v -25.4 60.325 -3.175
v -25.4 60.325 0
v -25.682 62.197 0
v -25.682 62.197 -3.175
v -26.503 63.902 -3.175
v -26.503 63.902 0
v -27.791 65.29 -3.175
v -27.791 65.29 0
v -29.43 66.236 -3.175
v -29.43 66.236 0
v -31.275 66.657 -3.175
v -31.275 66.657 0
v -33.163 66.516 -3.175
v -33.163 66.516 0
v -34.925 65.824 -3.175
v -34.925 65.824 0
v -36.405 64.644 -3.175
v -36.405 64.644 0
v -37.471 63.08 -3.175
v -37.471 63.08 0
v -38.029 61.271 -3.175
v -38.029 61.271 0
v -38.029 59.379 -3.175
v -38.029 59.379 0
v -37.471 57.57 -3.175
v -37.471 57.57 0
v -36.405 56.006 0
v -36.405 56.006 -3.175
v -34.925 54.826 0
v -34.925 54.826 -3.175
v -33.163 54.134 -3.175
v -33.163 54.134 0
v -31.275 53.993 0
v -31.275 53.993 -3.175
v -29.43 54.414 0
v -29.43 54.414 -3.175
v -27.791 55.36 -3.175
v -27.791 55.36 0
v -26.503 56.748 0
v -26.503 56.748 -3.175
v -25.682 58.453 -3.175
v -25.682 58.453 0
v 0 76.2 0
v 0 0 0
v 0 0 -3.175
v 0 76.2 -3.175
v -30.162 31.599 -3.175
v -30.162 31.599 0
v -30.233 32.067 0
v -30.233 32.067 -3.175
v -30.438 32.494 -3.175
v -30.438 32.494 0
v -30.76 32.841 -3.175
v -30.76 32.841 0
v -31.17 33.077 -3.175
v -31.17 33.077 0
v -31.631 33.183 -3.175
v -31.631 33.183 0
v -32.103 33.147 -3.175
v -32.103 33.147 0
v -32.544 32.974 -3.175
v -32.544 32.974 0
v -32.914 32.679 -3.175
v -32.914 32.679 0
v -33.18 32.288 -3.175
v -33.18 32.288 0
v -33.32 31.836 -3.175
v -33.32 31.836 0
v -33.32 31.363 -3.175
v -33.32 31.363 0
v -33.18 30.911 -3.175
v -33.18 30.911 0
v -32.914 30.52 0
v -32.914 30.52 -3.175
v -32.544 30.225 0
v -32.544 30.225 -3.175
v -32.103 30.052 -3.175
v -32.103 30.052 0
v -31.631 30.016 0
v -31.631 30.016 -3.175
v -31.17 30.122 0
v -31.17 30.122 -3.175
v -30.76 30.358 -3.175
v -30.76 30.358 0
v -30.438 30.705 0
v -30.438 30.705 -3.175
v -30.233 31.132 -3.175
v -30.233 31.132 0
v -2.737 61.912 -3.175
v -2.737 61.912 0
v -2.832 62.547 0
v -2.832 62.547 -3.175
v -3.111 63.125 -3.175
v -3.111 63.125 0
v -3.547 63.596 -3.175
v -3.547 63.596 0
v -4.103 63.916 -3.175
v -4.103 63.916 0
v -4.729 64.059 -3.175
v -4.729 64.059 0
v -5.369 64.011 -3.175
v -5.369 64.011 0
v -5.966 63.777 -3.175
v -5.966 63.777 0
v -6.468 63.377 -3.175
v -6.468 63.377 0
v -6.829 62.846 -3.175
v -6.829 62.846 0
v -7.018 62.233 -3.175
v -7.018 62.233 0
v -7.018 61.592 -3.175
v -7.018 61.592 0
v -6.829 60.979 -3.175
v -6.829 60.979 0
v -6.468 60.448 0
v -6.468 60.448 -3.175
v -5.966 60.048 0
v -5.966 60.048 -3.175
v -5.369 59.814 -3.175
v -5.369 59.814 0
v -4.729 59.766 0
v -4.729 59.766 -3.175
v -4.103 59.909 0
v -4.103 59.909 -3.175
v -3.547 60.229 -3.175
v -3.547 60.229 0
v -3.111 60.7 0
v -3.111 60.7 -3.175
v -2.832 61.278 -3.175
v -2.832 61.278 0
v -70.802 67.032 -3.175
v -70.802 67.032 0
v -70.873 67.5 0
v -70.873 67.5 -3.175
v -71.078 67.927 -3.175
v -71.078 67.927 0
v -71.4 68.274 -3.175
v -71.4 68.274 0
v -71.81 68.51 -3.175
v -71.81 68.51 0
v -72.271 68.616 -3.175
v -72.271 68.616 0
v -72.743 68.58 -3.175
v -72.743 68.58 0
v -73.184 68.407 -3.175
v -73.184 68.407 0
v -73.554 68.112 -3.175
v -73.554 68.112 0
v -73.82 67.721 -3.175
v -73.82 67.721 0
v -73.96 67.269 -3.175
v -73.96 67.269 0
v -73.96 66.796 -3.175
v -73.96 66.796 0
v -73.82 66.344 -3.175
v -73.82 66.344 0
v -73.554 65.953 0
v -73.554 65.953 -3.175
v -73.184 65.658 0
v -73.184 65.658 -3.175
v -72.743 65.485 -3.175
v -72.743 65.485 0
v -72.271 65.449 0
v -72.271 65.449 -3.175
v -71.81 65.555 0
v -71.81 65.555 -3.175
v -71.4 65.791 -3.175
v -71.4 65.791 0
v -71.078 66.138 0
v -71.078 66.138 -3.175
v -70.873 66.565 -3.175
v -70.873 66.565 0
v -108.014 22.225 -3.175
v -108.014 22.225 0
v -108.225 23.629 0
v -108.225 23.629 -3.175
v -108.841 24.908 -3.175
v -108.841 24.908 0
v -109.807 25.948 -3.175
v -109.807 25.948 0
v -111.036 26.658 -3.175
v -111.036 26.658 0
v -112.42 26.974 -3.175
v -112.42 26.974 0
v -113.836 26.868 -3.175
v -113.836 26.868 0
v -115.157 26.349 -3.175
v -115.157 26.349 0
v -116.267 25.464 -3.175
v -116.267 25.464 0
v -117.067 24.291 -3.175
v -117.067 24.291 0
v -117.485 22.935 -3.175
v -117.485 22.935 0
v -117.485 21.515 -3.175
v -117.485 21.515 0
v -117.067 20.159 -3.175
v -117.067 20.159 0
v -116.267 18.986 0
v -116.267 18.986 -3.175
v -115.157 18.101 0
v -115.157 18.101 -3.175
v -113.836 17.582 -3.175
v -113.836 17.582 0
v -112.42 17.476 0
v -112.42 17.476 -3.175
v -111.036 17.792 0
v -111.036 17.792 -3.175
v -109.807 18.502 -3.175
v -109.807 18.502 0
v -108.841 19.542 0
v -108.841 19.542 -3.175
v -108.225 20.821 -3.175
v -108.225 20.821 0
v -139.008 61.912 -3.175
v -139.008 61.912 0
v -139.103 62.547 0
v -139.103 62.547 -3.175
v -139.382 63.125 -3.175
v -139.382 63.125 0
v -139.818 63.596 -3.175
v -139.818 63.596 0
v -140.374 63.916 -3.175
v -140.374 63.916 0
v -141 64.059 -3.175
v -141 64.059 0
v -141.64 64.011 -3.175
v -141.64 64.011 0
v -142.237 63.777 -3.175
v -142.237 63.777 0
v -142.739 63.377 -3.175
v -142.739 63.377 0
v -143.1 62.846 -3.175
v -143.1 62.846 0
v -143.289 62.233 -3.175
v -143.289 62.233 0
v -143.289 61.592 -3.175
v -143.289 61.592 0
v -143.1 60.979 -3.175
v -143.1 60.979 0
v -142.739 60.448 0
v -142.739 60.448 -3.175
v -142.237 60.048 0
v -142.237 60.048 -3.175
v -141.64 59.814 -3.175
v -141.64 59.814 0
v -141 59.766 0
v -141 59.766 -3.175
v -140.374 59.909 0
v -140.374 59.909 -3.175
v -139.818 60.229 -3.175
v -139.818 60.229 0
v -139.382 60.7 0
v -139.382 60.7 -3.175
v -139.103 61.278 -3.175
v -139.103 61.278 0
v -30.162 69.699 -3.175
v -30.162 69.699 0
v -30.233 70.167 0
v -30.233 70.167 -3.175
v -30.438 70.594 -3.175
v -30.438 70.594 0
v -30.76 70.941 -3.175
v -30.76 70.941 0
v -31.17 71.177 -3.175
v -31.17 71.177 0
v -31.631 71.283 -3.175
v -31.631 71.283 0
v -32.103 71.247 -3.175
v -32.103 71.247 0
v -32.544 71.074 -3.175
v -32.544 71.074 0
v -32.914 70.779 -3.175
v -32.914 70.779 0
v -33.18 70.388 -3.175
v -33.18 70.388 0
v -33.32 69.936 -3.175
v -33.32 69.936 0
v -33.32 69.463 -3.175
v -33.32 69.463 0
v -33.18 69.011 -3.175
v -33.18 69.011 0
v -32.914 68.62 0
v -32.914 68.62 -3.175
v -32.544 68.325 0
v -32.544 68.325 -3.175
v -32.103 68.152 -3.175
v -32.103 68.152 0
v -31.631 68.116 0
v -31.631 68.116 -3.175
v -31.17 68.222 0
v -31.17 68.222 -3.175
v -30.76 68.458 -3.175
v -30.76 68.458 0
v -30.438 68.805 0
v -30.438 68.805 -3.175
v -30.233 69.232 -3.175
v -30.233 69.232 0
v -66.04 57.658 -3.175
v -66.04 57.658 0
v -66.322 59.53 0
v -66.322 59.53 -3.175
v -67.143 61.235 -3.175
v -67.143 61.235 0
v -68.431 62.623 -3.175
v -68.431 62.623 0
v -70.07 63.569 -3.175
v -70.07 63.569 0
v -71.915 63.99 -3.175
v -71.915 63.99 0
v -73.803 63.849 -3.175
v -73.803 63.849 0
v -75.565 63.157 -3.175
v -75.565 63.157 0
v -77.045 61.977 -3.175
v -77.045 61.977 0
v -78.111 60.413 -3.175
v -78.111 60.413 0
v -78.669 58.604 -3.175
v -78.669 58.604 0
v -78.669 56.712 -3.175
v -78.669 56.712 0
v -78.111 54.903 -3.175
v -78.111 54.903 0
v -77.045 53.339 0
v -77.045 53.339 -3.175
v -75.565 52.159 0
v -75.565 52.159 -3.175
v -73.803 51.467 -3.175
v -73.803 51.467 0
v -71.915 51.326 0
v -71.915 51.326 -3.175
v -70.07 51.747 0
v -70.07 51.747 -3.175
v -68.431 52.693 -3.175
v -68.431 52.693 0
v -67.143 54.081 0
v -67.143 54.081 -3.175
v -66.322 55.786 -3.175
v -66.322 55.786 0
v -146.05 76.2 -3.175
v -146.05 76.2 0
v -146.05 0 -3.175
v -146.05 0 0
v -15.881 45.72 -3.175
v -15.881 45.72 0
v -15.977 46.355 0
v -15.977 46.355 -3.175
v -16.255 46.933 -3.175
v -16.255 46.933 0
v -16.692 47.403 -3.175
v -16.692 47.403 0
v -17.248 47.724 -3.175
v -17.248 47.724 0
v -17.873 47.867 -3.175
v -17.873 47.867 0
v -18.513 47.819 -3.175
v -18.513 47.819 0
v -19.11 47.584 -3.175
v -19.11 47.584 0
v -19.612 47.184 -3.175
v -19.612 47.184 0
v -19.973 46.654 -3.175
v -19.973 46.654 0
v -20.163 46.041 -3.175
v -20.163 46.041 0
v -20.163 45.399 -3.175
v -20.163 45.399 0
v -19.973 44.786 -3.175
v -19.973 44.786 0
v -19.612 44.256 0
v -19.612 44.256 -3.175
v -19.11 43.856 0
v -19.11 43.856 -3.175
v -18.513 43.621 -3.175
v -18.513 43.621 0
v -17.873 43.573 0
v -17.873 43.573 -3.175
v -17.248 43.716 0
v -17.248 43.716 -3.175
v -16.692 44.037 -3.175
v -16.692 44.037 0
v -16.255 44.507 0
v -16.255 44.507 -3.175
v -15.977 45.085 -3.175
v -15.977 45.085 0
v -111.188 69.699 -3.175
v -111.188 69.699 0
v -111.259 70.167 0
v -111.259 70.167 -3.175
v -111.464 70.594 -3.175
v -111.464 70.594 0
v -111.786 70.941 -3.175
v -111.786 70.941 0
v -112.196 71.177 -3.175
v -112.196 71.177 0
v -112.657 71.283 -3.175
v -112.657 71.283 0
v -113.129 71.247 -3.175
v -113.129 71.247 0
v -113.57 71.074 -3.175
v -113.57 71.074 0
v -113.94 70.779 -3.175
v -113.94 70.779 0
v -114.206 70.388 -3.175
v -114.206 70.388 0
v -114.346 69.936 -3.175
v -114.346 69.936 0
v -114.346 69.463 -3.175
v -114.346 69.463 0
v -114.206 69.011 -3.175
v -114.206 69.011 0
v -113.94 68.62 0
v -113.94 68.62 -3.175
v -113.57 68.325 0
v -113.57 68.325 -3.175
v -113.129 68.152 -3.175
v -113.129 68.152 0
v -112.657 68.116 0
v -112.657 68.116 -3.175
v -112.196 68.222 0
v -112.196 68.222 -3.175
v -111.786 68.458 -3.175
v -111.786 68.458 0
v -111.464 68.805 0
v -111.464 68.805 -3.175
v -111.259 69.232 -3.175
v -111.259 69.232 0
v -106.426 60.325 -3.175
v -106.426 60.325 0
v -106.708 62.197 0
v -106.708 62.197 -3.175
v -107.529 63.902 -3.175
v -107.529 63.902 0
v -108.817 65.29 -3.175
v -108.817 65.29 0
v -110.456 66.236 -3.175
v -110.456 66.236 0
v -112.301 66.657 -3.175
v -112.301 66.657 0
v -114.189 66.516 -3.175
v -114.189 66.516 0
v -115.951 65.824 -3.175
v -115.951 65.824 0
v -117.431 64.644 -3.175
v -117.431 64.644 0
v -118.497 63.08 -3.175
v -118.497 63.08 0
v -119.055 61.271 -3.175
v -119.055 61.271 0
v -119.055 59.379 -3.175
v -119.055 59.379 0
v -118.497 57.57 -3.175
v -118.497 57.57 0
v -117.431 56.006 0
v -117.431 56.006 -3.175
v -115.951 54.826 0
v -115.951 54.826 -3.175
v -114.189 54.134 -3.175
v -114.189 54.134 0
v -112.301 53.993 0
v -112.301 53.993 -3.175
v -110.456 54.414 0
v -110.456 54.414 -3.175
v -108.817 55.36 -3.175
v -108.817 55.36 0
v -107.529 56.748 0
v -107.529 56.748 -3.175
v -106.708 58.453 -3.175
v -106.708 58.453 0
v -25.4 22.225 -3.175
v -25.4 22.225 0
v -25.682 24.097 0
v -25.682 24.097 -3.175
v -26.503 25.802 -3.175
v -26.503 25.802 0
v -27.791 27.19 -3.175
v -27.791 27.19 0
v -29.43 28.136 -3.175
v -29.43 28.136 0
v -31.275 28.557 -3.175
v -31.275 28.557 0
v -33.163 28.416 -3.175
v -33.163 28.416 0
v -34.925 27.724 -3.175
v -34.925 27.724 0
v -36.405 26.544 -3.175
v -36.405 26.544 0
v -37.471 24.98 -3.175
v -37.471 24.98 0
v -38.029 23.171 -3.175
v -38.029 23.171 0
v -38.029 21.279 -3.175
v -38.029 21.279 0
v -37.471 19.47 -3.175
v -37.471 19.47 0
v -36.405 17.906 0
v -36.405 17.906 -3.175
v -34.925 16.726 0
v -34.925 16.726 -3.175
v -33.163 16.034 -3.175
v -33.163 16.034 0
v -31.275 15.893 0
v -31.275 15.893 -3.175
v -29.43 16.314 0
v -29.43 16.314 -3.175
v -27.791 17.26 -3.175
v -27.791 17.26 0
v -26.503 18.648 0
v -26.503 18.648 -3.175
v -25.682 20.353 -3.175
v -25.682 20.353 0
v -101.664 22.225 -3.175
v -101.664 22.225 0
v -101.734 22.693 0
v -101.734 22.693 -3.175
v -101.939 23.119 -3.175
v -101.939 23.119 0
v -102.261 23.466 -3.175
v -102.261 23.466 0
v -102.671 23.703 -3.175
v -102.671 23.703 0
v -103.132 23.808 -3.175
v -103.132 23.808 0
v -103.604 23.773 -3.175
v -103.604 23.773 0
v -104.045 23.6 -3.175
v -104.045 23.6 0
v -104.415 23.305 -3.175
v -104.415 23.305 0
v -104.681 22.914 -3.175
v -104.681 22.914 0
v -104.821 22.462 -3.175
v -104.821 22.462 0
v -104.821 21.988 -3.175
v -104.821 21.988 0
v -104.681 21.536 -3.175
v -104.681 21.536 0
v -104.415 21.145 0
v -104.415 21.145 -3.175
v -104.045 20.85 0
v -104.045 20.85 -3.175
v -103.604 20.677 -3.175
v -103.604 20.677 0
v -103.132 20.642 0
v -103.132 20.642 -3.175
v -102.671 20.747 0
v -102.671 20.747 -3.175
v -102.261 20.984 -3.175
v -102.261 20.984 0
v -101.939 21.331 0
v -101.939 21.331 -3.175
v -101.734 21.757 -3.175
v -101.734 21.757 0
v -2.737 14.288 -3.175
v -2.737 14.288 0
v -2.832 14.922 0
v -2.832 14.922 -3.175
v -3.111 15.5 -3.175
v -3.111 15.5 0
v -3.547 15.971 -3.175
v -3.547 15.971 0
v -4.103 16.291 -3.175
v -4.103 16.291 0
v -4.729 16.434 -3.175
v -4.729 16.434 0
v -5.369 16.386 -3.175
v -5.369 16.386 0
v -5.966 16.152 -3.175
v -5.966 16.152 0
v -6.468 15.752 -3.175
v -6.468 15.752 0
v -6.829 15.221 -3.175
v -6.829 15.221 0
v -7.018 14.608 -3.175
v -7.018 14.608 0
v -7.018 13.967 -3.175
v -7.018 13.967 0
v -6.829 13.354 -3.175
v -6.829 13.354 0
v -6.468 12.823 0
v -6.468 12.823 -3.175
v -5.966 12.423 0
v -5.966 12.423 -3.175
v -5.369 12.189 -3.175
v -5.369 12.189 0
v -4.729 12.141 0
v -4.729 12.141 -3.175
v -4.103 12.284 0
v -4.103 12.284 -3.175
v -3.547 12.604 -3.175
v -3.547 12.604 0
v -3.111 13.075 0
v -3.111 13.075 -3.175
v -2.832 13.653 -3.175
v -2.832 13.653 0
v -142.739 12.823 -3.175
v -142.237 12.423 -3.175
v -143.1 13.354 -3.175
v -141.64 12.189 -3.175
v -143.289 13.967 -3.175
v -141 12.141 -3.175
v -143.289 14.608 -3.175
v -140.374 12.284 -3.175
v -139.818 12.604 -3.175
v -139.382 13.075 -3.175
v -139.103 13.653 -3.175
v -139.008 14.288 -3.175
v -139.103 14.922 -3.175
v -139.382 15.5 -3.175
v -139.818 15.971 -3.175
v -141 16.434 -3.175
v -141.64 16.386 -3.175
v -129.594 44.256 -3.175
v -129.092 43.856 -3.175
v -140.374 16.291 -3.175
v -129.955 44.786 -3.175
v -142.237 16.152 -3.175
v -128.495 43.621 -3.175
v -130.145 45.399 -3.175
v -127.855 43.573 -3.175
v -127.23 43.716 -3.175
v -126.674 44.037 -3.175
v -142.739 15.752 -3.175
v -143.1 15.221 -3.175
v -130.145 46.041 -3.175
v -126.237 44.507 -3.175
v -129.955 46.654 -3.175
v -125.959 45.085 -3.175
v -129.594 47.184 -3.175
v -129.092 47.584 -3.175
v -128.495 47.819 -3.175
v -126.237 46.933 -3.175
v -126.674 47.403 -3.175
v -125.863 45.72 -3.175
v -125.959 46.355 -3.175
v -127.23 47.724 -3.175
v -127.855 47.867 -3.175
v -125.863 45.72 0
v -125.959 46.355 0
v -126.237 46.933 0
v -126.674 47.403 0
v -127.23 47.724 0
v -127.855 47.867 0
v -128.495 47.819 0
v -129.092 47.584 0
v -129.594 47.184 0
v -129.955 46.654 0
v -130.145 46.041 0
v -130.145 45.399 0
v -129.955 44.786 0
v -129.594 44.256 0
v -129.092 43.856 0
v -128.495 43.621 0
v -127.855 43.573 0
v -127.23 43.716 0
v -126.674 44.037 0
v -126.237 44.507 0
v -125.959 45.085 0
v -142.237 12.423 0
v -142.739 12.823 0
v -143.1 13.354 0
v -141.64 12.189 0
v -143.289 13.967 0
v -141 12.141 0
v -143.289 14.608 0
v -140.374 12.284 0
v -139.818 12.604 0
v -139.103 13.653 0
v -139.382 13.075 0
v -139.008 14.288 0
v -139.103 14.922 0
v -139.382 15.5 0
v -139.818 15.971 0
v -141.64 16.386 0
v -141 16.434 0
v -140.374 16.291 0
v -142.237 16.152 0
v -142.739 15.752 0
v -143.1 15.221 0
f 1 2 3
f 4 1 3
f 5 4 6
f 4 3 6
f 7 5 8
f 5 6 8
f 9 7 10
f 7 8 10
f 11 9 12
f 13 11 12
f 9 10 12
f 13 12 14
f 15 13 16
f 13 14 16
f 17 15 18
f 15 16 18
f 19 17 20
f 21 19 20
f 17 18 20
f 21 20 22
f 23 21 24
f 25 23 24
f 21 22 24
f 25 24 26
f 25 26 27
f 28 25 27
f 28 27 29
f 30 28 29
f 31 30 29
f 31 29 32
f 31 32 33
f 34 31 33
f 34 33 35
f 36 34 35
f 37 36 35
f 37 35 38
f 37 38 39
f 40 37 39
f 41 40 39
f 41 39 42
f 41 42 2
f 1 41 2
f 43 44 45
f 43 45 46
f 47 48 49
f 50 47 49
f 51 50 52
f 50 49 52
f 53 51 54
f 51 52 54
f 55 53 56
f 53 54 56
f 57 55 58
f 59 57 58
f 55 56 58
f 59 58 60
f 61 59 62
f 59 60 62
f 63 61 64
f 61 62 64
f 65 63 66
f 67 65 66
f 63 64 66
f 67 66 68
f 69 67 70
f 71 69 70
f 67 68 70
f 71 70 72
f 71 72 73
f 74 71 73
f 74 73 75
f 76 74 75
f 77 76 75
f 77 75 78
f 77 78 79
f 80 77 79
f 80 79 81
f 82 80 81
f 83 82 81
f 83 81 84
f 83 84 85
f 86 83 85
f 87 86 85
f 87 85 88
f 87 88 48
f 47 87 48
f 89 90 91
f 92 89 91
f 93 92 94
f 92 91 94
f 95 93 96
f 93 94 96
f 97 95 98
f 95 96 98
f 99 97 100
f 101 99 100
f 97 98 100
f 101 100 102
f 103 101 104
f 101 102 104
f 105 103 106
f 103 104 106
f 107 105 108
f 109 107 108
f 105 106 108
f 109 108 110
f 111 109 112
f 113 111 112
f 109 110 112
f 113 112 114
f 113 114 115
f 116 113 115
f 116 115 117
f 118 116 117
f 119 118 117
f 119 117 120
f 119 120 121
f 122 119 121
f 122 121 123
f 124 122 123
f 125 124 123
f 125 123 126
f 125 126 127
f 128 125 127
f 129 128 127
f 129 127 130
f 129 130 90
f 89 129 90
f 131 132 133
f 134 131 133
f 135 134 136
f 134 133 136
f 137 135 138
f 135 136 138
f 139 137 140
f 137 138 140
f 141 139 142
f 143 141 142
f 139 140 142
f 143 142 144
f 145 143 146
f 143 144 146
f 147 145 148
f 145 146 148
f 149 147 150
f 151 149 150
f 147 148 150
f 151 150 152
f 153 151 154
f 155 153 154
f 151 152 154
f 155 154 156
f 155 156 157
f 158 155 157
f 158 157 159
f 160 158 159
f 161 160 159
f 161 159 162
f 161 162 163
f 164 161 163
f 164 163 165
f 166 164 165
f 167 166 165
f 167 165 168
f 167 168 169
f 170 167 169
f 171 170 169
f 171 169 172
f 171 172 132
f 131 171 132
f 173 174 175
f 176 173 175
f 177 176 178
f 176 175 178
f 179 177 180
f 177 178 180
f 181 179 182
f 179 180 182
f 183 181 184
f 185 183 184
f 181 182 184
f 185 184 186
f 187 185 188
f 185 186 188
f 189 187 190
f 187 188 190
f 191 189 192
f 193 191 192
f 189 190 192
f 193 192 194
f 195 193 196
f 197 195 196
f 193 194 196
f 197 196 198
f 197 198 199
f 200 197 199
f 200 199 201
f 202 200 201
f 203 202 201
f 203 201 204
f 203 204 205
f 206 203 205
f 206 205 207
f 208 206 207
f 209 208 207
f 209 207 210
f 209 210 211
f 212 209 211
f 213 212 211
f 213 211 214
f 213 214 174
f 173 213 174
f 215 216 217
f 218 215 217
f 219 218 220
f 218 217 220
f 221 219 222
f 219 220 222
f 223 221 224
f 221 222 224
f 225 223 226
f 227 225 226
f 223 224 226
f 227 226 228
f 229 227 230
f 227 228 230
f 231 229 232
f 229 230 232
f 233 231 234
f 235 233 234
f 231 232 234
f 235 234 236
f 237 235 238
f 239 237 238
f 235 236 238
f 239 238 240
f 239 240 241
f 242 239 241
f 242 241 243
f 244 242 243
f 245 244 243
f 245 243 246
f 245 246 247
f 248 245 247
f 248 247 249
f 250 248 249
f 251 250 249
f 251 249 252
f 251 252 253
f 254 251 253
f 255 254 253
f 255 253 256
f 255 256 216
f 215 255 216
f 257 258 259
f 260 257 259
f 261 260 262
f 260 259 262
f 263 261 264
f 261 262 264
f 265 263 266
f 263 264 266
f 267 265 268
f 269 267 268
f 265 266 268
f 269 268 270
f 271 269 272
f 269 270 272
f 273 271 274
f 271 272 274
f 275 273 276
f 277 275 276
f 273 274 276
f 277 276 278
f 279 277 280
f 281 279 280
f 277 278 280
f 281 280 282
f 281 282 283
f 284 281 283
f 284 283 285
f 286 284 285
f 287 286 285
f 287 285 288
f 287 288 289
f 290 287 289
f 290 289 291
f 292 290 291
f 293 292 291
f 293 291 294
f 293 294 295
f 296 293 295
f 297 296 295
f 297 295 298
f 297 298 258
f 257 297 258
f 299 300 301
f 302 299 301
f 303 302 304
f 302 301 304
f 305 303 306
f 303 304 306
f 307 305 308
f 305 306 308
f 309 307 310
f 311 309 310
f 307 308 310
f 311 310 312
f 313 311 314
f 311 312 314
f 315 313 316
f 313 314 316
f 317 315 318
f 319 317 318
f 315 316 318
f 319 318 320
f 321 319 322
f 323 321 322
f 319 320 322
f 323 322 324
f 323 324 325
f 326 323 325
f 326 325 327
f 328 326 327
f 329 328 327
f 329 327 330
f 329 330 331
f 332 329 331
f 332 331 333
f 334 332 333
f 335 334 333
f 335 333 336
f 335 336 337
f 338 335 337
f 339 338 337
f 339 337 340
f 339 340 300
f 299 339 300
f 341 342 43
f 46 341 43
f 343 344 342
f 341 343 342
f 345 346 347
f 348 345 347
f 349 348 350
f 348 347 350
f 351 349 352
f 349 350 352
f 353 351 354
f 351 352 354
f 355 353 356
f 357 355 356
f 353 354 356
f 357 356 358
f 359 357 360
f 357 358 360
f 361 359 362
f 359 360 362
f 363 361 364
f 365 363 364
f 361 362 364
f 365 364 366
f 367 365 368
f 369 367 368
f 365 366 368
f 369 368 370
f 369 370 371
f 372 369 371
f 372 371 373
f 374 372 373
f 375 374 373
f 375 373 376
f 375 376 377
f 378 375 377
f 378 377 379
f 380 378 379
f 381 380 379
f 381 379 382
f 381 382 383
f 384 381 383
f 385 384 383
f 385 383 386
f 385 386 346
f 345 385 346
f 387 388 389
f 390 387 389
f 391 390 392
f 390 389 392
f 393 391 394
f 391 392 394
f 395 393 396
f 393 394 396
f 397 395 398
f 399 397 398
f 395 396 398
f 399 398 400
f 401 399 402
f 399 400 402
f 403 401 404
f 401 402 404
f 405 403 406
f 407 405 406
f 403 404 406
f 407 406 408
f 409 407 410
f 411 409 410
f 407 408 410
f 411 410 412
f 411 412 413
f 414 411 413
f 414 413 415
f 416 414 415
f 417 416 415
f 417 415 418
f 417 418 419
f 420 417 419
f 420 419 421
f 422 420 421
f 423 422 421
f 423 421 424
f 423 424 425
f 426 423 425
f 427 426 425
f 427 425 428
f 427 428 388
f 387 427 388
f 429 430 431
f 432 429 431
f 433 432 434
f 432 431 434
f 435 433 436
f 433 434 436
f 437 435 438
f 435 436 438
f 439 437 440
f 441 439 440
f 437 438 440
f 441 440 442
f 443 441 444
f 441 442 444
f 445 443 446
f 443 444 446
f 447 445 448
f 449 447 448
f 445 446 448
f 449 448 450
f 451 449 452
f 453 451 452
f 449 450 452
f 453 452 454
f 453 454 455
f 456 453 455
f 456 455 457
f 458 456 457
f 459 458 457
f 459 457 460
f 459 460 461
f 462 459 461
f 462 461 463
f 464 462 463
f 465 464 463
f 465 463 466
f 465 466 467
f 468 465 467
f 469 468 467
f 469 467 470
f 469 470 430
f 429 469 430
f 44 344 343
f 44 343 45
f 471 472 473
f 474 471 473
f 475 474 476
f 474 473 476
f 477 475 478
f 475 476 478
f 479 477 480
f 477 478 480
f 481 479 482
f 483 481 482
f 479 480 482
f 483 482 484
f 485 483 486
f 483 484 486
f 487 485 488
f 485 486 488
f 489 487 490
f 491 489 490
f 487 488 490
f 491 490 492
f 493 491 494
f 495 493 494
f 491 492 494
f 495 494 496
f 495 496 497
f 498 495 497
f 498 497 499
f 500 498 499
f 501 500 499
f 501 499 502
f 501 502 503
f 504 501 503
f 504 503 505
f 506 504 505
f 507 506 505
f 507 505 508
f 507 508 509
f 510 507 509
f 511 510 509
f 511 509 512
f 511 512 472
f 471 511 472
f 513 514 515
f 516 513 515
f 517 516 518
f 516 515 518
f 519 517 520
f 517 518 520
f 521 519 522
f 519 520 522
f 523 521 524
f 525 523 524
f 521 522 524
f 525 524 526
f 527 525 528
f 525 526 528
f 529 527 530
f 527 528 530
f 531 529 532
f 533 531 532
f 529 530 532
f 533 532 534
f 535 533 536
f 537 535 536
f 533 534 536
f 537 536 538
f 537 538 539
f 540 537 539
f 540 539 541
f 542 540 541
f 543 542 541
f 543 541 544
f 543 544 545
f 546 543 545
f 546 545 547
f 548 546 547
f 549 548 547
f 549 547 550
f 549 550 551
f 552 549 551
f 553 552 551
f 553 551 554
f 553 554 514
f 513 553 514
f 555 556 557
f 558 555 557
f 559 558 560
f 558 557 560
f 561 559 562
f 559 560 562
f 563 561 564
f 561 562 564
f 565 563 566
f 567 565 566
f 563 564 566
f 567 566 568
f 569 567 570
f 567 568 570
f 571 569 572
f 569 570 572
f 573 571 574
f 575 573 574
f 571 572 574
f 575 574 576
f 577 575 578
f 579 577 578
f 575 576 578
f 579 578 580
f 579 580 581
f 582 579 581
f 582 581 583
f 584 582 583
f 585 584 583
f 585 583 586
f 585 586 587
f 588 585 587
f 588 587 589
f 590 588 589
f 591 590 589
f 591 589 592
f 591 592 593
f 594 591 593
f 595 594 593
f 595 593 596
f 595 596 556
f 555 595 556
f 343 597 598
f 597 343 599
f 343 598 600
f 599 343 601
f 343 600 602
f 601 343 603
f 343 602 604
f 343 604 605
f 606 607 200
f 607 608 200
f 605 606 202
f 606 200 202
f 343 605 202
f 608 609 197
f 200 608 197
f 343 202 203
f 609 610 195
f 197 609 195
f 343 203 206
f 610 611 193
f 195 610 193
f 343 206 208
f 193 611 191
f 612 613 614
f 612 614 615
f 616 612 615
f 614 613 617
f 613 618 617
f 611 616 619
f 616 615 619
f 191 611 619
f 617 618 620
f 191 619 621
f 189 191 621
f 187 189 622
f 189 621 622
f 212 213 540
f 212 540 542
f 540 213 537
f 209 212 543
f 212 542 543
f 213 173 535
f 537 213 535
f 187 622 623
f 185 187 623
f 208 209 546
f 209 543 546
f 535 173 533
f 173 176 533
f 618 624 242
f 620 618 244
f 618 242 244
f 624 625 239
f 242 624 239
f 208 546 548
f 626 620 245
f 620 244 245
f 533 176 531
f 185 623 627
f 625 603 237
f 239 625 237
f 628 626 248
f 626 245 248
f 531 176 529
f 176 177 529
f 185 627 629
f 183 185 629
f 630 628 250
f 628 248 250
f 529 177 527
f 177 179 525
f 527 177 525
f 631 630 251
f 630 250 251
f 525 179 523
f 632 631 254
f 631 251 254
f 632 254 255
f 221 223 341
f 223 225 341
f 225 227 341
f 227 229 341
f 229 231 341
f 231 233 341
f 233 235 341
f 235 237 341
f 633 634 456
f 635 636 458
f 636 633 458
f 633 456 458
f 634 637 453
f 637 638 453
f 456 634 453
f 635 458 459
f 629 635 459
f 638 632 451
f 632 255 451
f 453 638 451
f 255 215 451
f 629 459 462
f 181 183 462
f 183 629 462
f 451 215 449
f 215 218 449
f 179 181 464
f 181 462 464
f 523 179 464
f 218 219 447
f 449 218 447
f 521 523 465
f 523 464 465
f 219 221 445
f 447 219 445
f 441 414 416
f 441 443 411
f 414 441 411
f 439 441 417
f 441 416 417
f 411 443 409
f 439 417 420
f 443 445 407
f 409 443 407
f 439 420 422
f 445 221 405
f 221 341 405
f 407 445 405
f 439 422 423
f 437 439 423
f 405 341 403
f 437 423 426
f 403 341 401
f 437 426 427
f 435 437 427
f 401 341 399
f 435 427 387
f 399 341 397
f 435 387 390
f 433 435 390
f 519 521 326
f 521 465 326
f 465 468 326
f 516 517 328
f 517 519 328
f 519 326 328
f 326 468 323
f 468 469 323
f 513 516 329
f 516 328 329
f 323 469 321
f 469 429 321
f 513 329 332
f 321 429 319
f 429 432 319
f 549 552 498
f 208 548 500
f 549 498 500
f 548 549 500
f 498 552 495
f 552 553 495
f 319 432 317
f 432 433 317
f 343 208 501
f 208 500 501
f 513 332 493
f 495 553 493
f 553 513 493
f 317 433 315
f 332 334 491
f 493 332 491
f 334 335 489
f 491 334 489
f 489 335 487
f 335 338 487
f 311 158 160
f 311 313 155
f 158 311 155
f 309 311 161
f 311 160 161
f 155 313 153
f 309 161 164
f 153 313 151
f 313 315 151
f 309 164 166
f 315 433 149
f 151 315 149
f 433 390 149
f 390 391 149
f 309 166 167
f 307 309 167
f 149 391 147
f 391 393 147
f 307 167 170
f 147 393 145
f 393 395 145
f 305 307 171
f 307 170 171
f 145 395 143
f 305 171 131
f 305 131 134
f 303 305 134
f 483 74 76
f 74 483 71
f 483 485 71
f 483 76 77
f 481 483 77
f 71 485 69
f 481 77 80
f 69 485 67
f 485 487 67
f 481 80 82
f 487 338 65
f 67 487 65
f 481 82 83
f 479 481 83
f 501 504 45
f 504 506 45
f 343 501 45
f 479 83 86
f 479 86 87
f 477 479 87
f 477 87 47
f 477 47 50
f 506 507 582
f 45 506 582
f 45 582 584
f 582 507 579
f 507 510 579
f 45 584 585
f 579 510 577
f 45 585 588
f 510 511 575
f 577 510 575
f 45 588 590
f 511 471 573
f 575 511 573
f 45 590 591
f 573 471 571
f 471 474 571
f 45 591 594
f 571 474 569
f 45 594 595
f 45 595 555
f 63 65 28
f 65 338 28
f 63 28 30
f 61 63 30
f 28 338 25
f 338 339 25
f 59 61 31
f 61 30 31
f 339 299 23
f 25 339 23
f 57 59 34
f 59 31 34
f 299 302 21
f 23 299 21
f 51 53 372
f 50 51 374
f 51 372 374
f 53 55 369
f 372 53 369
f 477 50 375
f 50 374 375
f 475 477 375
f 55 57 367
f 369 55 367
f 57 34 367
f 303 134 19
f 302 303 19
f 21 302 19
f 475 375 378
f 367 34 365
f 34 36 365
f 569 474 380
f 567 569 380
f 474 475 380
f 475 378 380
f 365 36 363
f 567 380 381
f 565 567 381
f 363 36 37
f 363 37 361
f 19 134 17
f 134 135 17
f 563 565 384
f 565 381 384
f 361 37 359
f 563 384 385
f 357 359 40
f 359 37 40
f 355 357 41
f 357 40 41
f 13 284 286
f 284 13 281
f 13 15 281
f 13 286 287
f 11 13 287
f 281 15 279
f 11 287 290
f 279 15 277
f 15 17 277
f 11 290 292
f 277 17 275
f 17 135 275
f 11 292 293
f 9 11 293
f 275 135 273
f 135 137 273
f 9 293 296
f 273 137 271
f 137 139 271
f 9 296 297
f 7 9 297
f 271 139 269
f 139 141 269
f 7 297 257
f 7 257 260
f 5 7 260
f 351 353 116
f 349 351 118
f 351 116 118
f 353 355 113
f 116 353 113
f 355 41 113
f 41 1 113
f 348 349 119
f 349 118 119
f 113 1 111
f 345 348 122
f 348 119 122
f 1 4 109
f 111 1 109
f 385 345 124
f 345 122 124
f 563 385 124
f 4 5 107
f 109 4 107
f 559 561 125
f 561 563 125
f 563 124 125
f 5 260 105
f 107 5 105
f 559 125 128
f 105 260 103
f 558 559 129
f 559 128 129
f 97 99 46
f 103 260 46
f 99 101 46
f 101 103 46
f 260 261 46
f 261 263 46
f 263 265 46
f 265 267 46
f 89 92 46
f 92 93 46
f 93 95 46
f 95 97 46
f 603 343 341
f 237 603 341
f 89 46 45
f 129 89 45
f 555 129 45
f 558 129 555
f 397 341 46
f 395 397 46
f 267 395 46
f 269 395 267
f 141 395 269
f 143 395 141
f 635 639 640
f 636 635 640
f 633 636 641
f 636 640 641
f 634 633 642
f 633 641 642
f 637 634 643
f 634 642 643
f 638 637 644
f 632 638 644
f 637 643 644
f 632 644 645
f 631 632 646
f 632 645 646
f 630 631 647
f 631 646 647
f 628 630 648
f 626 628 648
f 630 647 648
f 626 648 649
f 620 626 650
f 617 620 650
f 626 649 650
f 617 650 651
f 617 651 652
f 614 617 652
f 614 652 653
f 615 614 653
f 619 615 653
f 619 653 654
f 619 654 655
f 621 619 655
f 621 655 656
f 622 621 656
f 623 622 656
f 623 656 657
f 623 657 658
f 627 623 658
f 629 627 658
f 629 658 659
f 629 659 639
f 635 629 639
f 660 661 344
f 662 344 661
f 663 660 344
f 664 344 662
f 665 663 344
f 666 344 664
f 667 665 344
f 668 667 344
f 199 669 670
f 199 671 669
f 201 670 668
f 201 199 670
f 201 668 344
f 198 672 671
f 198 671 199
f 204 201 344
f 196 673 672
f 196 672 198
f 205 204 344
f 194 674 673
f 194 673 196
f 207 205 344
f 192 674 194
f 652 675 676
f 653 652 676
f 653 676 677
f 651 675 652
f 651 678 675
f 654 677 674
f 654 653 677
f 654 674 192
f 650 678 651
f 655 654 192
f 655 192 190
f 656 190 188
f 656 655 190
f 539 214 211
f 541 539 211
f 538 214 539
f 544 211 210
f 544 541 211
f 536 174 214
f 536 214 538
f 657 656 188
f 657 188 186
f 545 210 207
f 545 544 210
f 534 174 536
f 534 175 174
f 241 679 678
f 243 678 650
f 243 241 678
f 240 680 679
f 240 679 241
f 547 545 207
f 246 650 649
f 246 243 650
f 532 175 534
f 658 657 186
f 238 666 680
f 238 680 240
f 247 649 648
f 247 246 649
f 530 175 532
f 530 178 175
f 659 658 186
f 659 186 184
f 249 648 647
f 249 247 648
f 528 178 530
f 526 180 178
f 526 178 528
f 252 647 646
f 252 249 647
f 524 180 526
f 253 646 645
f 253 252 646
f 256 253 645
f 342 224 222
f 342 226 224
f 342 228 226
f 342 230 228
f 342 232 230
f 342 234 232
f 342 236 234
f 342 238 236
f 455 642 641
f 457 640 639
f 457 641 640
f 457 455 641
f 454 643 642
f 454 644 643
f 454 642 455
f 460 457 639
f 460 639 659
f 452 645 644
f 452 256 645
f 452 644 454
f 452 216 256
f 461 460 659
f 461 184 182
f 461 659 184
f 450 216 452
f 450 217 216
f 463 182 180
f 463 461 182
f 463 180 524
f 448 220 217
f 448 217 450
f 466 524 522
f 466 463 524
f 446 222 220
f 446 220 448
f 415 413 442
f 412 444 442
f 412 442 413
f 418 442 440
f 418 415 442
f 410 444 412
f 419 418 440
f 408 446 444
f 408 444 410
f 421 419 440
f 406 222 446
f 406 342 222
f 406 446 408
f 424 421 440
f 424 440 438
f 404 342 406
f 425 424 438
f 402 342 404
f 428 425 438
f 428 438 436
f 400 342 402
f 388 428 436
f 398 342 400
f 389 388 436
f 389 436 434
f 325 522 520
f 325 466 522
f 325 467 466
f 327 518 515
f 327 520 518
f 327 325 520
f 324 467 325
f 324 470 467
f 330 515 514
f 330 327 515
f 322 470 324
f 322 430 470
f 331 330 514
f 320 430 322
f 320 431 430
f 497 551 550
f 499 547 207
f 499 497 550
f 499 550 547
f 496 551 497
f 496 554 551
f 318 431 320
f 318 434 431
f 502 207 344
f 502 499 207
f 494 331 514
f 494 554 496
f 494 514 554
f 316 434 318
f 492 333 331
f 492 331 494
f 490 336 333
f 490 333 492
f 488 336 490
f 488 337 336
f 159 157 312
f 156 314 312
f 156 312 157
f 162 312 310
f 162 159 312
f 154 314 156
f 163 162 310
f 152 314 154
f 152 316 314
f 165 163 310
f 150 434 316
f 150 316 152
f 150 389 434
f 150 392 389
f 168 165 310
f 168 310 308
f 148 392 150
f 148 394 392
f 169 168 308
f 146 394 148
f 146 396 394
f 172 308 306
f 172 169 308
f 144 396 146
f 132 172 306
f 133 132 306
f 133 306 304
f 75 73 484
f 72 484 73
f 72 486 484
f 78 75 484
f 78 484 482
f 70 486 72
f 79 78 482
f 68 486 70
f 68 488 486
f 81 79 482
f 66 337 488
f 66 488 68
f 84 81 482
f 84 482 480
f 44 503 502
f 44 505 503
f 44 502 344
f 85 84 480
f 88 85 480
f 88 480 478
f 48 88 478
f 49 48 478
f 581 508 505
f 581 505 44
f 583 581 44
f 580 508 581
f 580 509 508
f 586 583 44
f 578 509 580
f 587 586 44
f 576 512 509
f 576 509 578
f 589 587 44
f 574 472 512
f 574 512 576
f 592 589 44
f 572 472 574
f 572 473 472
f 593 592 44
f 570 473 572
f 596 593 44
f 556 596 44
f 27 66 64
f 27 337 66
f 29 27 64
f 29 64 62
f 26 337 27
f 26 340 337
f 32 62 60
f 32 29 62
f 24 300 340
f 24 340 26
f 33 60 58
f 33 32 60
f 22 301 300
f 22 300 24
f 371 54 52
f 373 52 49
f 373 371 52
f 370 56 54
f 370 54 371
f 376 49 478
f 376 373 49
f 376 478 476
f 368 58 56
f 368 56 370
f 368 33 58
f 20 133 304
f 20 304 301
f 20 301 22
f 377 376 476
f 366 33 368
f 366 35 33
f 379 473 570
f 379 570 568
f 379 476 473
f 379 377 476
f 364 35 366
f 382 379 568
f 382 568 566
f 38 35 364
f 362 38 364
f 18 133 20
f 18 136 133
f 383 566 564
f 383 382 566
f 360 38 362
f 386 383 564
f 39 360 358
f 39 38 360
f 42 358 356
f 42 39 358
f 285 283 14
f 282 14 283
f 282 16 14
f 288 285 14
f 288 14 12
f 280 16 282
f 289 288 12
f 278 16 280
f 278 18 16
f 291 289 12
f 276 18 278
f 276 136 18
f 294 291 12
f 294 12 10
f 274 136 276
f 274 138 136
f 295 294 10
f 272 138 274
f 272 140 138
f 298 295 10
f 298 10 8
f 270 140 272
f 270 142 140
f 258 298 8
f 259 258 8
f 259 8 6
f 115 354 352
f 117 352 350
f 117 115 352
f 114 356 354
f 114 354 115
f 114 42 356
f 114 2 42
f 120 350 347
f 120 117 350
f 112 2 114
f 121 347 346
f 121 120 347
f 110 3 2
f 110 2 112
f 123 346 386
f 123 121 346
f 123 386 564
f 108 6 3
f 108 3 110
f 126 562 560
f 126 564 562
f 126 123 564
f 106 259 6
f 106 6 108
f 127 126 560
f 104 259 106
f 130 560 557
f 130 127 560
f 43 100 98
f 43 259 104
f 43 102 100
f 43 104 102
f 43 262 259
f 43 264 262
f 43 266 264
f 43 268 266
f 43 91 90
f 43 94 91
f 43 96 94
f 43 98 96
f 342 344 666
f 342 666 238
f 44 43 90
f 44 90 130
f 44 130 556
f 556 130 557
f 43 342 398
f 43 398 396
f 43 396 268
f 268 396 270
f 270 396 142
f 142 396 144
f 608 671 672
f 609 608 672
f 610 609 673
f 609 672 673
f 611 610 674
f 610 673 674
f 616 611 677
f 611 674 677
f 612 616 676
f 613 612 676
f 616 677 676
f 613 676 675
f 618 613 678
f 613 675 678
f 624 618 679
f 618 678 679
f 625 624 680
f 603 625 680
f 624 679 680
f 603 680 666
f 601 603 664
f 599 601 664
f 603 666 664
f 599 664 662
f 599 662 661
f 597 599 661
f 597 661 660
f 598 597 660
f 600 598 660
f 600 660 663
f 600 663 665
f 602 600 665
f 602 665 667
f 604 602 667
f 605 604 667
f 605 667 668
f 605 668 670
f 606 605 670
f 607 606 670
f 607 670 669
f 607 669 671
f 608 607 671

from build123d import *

# Parameters (mm, degrees)
SKETCH1_W                    = 146.05
SKETCH1_H                    = 76.2
BOSS_EXTRUDE1_DEPTH          = 3.175
F_6_CLEARANCE_HOLE1_D        = 4.3053
F_3_8_0_375_DIAMETER_HOLE1_D = 9.525
F_1_2_0_5_DIAMETER_HOLE1_D   = 12.7
F_1_8_0_125_DIAMETER_HOLE1_D = 3.175


with BuildPart() as part:
    # Sketch1 → Boss-Extrude1 (new body)
    with BuildSketch(Plane.XY):
        with Locations((-73.025, 38.1)):
            Rectangle(SKETCH1_W, SKETCH1_H)
    extrude(amount=-BOSS_EXTRUDE1_DEPTH)

    # #6 Clearance Hole1 (through all)
    with Locations(Plane(origin=(0, 0, -3.175), x_dir=(-1, 0, 0), z_dir=(0, 0, -1))):
        with Locations((4.8895, 61.9125), (4.8895, 14.2875), (141.1605, 14.2875), (141.1605, 61.9125), (128.016, 45.72), (18.034, 45.72)):
            Hole(F_6_CLEARANCE_HOLE1_D / 2)

    # 3/8 (0.375) Diameter Hole1 (through all)
    with Locations(Plane(origin=(0, 0, -3.175), x_dir=(-1, 0, 0), z_dir=(0, 0, -1))):
        with Locations((112.776, 22.225)):
            Hole(F_3_8_0_375_DIAMETER_HOLE1_D / 2)

    # 1/2 (0.5) Diameter Hole1 (through all)
    with Locations(Plane(origin=(0, 0, -3.175), x_dir=(-1, 0, 0), z_dir=(0, 0, -1))):
        with Locations((31.75, 60.325), (72.39, 57.658), (112.776, 60.325), (31.75, 22.225)):
            Hole(F_1_2_0_5_DIAMETER_HOLE1_D / 2)

    # 1/8 (0.125) Diameter Hole1 (through all)
    with Locations(Plane(origin=(0, 0, -3.175), x_dir=(-1, 0, 0), z_dir=(0, 0, -1))):
        with Locations((31.75, 69.699492067), (112.776, 69.699492067), (103.251, 22.225), (72.39, 67.032492067), (31.75, 31.599492067)):
            Hole(F_1_8_0_125_DIAMETER_HOLE1_D / 2)


solid = part.part
